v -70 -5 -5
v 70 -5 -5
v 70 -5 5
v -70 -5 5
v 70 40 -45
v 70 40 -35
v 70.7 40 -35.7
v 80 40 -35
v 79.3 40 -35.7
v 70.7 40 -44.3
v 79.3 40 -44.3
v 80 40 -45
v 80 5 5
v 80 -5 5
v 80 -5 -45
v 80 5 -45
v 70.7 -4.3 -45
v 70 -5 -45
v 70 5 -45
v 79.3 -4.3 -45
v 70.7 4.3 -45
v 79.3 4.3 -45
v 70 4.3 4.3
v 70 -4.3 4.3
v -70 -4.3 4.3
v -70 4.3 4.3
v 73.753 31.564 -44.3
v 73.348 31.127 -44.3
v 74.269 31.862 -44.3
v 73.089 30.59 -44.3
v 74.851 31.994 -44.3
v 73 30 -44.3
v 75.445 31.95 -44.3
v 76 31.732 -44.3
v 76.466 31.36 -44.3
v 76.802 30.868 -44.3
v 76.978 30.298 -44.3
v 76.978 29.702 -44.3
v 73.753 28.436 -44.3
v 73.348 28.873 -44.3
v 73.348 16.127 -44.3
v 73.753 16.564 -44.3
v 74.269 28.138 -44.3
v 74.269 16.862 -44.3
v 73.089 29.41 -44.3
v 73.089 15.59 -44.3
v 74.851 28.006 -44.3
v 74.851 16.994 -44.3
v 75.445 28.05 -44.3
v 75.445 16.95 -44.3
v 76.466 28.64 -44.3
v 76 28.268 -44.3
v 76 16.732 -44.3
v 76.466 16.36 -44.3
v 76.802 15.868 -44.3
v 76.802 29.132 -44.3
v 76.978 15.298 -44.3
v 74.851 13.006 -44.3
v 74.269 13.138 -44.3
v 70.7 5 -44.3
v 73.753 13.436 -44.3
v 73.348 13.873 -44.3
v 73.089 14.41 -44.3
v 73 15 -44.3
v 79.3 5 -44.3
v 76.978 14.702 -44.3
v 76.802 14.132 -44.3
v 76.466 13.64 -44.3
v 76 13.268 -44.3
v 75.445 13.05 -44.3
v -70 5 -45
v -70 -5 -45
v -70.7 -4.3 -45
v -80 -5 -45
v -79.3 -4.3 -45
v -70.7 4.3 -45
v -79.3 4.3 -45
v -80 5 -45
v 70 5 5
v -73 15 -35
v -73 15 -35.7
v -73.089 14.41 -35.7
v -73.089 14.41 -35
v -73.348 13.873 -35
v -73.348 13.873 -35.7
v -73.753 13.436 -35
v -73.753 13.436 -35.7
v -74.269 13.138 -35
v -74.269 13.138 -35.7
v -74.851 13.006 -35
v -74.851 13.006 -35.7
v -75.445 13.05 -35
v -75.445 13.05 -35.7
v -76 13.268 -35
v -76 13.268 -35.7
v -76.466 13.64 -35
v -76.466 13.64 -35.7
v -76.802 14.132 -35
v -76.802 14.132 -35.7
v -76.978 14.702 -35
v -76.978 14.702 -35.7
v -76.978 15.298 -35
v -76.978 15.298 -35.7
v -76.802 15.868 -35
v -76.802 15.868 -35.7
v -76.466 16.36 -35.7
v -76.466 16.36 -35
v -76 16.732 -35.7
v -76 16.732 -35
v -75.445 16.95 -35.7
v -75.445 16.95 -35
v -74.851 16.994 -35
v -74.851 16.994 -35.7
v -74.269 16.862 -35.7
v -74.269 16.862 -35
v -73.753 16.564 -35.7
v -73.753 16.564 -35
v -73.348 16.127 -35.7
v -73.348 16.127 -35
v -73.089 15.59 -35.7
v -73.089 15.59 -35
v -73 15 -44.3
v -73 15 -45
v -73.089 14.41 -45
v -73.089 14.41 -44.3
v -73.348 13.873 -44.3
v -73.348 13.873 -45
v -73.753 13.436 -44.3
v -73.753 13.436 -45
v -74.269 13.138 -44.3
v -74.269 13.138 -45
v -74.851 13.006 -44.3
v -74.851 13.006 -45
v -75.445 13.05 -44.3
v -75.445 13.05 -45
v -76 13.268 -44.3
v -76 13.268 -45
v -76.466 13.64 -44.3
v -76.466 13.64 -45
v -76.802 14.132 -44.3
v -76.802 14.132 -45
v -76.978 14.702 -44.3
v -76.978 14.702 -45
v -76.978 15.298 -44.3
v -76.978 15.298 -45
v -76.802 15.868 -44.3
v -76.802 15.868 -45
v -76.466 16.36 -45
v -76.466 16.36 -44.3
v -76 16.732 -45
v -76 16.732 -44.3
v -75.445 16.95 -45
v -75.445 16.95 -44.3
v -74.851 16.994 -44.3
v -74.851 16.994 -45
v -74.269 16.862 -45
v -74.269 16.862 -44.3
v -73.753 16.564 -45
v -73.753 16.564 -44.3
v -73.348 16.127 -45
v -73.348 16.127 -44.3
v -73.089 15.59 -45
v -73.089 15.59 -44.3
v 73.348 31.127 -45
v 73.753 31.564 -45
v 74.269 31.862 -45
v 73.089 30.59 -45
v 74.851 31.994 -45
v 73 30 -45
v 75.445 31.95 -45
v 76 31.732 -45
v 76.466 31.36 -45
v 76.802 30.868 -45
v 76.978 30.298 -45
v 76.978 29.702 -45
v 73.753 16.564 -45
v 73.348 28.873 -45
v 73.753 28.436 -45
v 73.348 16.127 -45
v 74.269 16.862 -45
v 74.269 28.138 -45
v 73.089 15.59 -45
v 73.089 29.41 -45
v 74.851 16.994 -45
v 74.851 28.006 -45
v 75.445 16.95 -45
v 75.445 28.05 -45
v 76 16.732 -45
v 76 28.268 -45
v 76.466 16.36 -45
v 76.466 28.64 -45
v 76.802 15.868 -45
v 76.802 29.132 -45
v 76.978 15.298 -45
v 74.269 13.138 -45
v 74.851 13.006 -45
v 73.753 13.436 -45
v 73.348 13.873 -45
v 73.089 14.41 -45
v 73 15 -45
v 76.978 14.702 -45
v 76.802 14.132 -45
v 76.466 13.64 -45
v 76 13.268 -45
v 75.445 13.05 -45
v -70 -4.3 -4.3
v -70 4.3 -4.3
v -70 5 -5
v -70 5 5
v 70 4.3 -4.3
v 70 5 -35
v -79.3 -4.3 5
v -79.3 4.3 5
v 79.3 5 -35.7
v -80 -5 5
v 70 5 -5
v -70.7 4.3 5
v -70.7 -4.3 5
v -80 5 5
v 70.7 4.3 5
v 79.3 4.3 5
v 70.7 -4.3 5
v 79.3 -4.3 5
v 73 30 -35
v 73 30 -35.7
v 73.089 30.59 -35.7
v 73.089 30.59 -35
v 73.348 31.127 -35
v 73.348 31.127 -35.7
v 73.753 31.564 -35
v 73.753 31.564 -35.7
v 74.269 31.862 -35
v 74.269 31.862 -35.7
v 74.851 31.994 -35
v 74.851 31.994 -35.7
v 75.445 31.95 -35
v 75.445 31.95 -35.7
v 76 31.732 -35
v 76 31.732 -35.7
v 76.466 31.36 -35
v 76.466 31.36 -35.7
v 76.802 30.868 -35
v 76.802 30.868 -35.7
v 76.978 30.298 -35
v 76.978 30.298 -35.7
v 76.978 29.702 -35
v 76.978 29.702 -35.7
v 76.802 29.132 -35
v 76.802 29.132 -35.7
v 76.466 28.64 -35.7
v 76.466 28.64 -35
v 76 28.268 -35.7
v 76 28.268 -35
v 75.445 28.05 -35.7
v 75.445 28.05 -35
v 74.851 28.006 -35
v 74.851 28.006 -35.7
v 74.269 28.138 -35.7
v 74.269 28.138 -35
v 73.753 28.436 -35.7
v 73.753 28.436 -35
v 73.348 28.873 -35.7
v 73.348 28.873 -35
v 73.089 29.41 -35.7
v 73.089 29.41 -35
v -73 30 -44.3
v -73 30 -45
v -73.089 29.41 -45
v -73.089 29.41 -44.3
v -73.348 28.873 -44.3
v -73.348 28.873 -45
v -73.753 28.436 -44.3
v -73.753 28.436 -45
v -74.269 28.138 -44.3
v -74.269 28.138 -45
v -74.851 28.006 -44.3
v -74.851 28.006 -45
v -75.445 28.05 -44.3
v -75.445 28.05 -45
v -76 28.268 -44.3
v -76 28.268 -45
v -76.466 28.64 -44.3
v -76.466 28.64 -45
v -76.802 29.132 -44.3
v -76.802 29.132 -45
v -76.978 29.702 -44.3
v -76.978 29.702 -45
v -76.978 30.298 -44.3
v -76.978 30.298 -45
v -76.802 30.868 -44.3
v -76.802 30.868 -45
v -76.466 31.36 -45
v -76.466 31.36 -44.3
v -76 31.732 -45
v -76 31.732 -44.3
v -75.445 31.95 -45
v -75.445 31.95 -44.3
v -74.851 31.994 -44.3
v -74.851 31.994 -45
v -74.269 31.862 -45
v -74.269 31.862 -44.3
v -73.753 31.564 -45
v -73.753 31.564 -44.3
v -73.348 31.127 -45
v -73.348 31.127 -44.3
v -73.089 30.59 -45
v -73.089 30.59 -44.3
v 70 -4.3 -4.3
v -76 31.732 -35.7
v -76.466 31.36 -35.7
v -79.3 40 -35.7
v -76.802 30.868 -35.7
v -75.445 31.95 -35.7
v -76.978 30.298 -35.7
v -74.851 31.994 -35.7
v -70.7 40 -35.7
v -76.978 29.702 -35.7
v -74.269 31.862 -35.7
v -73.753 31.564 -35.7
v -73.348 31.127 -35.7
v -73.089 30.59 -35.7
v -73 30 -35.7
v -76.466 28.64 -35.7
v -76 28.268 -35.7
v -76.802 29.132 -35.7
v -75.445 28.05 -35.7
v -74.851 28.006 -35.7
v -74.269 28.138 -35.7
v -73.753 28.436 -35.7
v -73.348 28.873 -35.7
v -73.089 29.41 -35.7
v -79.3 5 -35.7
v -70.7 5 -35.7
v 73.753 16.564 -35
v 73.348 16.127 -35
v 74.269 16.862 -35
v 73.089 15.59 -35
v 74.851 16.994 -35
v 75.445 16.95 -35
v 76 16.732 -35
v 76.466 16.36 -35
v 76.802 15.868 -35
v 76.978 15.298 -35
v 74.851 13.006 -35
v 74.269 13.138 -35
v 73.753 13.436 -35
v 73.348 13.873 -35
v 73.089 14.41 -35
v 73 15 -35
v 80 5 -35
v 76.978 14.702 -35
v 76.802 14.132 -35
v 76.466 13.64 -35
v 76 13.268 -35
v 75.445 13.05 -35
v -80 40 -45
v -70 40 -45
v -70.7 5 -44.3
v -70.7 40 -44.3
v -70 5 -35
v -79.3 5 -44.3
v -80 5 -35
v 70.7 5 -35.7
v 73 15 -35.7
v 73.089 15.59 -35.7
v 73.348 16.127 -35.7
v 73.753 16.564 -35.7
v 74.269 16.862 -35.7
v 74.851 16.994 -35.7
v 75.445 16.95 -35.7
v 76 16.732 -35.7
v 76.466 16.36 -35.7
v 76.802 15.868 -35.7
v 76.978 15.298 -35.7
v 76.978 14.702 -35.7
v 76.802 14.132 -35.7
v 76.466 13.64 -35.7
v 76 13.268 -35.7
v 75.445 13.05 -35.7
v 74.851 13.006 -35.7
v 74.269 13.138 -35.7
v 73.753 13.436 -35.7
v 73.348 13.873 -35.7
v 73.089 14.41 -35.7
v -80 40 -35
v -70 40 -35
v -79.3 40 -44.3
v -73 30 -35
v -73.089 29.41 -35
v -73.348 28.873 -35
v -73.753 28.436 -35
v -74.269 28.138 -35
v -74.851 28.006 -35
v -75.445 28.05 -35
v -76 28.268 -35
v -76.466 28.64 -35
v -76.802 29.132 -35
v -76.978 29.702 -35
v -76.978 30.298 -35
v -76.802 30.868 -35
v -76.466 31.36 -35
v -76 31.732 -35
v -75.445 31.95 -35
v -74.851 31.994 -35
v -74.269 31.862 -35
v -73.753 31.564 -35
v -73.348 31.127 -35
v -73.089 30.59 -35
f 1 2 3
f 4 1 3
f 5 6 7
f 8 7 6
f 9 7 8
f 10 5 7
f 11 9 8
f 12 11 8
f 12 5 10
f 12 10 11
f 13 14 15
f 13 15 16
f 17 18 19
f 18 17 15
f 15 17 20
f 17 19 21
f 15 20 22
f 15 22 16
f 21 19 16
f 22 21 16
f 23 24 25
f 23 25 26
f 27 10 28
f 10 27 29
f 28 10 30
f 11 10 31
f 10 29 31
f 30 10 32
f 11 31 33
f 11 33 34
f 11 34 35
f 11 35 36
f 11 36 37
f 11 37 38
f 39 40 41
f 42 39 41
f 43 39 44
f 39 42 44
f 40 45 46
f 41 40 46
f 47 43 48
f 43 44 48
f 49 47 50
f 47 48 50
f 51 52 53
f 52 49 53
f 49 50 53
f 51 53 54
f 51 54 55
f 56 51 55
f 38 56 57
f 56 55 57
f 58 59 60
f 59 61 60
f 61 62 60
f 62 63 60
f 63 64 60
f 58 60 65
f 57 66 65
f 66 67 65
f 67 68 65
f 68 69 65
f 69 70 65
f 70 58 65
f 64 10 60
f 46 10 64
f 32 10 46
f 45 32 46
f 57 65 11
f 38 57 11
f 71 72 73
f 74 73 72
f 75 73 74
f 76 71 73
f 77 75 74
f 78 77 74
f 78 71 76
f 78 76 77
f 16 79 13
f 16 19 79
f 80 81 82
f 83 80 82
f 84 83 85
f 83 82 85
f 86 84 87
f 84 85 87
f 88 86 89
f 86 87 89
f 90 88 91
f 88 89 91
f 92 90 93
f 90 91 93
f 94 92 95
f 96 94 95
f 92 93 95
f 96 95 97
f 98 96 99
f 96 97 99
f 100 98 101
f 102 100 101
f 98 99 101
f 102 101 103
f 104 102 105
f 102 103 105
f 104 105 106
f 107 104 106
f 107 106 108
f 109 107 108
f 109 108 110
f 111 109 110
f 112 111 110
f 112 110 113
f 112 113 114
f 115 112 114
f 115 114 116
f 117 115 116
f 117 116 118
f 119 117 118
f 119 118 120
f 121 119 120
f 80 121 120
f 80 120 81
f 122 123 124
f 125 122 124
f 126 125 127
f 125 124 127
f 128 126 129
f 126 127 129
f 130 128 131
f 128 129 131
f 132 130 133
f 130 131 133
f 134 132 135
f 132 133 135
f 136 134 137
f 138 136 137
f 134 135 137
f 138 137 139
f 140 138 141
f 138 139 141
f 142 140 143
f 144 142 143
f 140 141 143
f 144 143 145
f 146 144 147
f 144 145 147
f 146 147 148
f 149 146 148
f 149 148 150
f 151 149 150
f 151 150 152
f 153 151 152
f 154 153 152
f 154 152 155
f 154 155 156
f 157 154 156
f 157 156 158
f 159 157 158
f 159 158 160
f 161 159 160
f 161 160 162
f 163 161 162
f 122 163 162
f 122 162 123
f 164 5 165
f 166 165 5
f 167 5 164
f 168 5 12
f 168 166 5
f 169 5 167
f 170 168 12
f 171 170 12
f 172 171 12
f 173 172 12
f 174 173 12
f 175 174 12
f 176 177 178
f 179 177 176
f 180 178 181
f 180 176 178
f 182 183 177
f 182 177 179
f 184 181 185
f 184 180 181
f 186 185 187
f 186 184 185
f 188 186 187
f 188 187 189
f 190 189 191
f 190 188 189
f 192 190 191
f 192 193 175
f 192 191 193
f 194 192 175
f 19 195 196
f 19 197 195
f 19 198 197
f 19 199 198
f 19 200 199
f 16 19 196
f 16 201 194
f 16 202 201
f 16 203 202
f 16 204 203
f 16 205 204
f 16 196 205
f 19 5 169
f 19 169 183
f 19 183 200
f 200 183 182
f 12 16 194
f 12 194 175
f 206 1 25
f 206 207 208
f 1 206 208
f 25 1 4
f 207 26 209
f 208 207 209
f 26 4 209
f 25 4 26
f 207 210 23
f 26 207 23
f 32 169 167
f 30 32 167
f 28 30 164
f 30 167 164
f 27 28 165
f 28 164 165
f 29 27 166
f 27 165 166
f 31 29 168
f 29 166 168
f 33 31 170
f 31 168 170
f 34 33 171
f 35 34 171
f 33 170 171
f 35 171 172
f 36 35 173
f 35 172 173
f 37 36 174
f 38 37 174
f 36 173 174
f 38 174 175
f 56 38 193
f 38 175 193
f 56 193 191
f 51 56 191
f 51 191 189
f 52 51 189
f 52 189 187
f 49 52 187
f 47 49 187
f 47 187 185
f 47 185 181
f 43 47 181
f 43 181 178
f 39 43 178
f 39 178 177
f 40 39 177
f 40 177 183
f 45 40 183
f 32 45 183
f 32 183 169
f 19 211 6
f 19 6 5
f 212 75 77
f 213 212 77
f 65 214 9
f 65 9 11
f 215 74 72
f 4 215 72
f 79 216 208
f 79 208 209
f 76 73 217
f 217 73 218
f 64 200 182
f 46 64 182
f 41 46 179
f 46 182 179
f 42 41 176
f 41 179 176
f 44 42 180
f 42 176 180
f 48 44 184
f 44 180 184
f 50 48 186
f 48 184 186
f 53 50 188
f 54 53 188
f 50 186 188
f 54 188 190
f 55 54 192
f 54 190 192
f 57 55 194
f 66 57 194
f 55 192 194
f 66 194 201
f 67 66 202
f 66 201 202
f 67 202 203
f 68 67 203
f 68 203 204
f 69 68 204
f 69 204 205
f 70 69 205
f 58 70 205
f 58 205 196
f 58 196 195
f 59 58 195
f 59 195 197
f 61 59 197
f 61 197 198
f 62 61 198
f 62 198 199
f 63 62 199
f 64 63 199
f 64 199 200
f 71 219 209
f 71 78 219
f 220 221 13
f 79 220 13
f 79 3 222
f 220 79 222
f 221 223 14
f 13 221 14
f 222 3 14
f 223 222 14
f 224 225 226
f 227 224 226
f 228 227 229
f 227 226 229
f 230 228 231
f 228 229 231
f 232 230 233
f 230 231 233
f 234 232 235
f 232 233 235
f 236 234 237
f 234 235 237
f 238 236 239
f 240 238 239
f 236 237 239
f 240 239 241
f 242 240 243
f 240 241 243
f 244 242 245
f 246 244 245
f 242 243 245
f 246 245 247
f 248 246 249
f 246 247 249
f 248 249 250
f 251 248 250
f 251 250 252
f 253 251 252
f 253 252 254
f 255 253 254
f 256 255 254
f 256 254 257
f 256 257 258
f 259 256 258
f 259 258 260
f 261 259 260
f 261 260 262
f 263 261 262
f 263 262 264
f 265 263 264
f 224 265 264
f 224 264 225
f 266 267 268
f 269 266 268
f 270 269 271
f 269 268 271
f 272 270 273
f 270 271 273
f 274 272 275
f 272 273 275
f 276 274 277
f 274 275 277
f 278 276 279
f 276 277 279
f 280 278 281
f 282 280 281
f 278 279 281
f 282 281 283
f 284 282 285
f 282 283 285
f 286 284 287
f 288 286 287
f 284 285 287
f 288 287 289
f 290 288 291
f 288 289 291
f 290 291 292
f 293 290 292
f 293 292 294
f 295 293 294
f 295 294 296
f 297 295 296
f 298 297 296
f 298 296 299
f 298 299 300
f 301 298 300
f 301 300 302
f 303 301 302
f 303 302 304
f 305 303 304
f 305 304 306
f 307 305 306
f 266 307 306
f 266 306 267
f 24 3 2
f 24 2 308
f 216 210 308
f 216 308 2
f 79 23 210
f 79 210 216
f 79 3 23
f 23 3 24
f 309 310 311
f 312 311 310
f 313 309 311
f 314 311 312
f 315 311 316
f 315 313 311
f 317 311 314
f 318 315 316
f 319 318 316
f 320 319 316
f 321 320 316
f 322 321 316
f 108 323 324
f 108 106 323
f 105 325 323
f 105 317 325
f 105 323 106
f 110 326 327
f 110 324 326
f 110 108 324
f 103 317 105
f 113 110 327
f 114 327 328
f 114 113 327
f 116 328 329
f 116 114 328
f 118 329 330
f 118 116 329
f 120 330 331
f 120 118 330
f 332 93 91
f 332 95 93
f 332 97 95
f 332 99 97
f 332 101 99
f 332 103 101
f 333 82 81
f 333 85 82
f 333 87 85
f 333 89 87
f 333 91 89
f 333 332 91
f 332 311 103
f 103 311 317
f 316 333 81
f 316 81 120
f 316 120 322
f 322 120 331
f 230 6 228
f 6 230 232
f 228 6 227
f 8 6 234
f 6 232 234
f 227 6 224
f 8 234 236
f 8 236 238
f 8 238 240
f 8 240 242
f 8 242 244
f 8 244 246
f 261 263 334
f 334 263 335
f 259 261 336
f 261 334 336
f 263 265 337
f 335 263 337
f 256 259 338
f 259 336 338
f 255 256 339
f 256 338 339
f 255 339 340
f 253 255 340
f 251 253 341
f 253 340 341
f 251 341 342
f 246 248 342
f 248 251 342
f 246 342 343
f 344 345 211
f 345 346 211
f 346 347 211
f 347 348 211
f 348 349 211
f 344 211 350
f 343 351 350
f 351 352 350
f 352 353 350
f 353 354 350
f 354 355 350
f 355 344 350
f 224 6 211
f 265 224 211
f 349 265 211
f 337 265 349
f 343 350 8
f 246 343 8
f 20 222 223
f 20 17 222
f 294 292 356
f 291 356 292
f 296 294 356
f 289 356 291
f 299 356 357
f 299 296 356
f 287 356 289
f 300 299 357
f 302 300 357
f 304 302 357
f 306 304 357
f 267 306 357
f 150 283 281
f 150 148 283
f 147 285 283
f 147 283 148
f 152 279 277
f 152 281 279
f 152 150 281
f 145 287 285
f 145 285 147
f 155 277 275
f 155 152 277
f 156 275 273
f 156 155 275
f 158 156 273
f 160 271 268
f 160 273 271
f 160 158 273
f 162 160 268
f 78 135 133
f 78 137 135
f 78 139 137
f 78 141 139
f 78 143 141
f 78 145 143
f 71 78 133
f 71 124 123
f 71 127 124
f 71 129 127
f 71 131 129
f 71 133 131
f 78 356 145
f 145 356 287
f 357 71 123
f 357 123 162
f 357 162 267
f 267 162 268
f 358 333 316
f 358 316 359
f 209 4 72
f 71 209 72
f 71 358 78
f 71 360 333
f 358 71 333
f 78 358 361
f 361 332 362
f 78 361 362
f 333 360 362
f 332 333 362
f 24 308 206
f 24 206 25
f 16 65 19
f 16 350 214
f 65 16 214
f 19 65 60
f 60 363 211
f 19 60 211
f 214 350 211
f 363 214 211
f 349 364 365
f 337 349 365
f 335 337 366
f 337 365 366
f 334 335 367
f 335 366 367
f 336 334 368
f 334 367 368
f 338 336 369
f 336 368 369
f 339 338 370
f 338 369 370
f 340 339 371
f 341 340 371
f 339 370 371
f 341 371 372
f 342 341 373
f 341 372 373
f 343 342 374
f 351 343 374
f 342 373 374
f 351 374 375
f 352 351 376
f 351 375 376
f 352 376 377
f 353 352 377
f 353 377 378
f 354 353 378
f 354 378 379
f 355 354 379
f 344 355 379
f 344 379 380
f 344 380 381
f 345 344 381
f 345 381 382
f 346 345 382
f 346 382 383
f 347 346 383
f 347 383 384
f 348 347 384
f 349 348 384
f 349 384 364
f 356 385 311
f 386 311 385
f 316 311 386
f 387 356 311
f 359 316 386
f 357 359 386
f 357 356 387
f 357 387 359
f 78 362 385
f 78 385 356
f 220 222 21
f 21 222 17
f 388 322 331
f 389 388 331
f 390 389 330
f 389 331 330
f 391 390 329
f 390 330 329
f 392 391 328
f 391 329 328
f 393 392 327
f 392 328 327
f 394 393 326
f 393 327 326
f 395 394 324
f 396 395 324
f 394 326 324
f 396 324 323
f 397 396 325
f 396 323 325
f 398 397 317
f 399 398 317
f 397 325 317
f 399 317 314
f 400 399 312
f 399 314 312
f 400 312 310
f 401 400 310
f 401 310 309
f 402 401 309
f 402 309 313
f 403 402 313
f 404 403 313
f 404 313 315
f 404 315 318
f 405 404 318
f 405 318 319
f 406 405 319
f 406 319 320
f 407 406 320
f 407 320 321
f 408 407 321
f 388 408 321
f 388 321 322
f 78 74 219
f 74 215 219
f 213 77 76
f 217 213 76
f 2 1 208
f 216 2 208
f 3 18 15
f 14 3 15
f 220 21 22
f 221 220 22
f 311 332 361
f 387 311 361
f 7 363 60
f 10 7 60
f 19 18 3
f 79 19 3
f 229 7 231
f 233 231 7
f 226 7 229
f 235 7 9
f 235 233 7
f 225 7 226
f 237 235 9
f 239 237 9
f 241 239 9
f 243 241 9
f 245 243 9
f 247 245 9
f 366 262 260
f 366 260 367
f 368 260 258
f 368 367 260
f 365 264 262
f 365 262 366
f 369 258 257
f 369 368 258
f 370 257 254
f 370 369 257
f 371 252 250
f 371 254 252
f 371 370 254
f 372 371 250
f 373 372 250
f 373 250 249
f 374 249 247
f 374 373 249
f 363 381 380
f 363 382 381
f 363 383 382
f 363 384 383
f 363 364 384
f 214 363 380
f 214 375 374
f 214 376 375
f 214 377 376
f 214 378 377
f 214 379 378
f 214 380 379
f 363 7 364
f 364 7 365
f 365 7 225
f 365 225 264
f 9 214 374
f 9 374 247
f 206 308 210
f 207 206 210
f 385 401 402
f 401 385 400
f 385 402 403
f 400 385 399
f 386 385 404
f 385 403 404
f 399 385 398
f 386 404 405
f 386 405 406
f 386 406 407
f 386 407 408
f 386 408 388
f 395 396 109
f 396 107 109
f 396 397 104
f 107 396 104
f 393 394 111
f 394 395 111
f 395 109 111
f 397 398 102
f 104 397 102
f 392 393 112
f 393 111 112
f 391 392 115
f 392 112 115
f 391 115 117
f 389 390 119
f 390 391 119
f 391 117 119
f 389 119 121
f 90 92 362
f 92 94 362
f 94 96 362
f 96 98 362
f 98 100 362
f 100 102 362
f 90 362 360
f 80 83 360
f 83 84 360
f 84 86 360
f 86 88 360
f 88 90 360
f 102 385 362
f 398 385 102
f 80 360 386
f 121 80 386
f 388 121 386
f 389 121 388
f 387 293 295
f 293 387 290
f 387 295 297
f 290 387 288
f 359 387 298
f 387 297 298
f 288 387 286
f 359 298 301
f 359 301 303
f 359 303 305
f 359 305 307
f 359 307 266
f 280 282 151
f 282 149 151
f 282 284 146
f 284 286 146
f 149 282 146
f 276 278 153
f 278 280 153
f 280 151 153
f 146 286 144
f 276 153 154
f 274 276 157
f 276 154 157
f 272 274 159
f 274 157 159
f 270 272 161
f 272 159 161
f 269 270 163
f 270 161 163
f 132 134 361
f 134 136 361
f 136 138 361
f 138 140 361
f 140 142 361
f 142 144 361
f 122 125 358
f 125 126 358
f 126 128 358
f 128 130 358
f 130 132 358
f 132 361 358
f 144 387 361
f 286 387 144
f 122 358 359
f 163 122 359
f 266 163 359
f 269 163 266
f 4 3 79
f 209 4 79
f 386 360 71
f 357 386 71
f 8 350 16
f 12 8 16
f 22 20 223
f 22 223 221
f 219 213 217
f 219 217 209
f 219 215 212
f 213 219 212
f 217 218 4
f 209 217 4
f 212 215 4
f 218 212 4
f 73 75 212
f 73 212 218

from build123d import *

# Parameters (mm, degrees)
SKETCH_11_ON_SEGMENT_1_W   = 10
SKETCH_11_ON_SEGMENT_1_H   = 10
SKETCH_11_ON_SEGMENT_1_W_2 = 8.6
SKETCH_11_ON_SEGMENT_1_H_2 = 8.6
F_10X10X0_7_1_DEPTH        = 48.071067812
SKETCH_11_ON_SEGMENT_2_W   = 10
SKETCH_11_ON_SEGMENT_2_H   = 10
SKETCH_11_ON_SEGMENT_2_W_2 = 8.6
SKETCH_11_ON_SEGMENT_2_H_2 = 8.6
F_10X10X0_7_1_2_DEPTH      = 166.142135624
F_10X10X0_7_1_3_DEPTH      = 40
F_10X10X0_7_1_3_DEPTH_BACK = 8.071067812
SKETCH_11_W                = 10
SKETCH_11_H                = 10
SKETCH_11_W_2              = 8.6
SKETCH_11_H_2              = 8.6
SKETCH_14_W                = 10
SKETCH_14_H                = 10
SKETCH_14_W_2              = 8.6
SKETCH_14_H_2              = 8.6
F_10X10X0_7_5_DEPTH        = 45
SKETCH_14_ON_SEGMENT_2_W   = 10
SKETCH_14_ON_SEGMENT_2_H   = 10
SKETCH_14_ON_SEGMENT_2_W_2 = 8.6
SKETCH_14_ON_SEGMENT_2_H_2 = 8.6
F_10X10X0_7_5_2_DEPTH      = 45
PART_START                 = 22.5
PART_RUN_ON_DEPTH          = 27.5
BODY_START                 = 17.5
BODY_3_RUN_ON_DEPTH        = 27.5
WELD_START                 = -5
WELD_TRIM_4_DEPTH          = 10
WELD_TRIM_4_2_DEPTH        = 0.7
WELD_START_2               = 4.3
WELD_TRIM_4_3_DEPTH        = 0.7
WELD_START_3               = 70
WELD_TRIM_4_4_OUTLINE_W    = 12
WELD_TRIM_4_4_OUTLINE_H    = 14
WELD_TRIM_4_4_DEPTH        = 10
WELD_START_4               = -80
WELD_TRIM_5_OUTLINE_W      = 12
WELD_TRIM_5_OUTLINE_H      = 13
WELD_TRIM_5_DEPTH          = 10
WELD_TRIM_5_2_DEPTH        = 10
WELD_TRIM_5_3_DEPTH        = 0.7
WELD_TRIM_5_4_DEPTH        = 0.7
SKETCH_15_R                = 2
CUT_EXTRUDE_1_DEPTH        = 10


# Read off the part's stored shape, not the designer's step: 剪裁/延伸4, 剪裁/延伸5
with BuildPart() as part:
    # 草图11 on segment 1 (carried to segment 1) → 常用材料 不锈钢10X10X0.7(1) (new body)
    with BuildSketch(Plane(origin=(75, 0, -40), x_dir=(1, 0, 0), z_dir=(0, 0, 1))):
        Rectangle(SKETCH_11_ON_SEGMENT_1_W, SKETCH_11_ON_SEGMENT_1_H)
        Rectangle(SKETCH_11_ON_SEGMENT_1_W_2, SKETCH_11_ON_SEGMENT_1_H_2, mode=Mode.SUBTRACT)
    extrude(amount=F_10X10X0_7_1_DEPTH)

    # 常用材料 不锈钢10X10X0.7(1) mitre 1
    split(bisect_by=Plane(origin=(75, 0, 0), x_dir=(0, 1, 0), z_dir=(0.707106781, 0, -0.707106781)), keep=Keep.TOP)

    # part cut square before the run-on
    split(bisect_by=Plane(origin=(75, 0, -17.5), x_dir=(0, -1, 0), z_dir=(0, 0, 1)), keep=Keep.TOP)

    # 草图11 on segment 1 (carried to segment 1) → part run on (add)
    with BuildSketch(Plane(origin=(75, 0, -40), x_dir=(1, 0, 0), z_dir=(0, 0, 1)).offset(PART_START)):
        Rectangle(SKETCH_11_ON_SEGMENT_1_W, SKETCH_11_ON_SEGMENT_1_H)
        Rectangle(SKETCH_11_ON_SEGMENT_1_W_2, SKETCH_11_ON_SEGMENT_1_H_2, mode=Mode.SUBTRACT)
    extrude(amount=-PART_RUN_ON_DEPTH)

    # Weld Trim 4 outline → Weld Trim 4 (add)
    with BuildSketch(Plane(origin=(0, 0, 0), x_dir=(1, 0, 0), z_dir=(0, 1, 0)).offset(WELD_START)):
        Polygon((70, 5), (70, -5), (70.7, -5), (70.7, 4.3), align=None)
        Polygon((79.3, -4.3), (79.3, -5), (80, -5), align=None)
    extrude(amount=WELD_TRIM_4_DEPTH)

    # Weld Trim 4 2 outline → Weld Trim 4 2 (add)
    with BuildSketch(Plane(origin=(0, 0, 0), x_dir=(1, 0, 0), z_dir=(0, 1, 0)).offset(WELD_START)):
        Polygon((70.7, 4.3), (70.7, -5), (79.3, -5), (79.3, -4.3), align=None)
    extrude(amount=WELD_TRIM_4_2_DEPTH)

    # Weld Trim 4 3 outline → Weld Trim 4 3 (add)
    with BuildSketch(Plane(origin=(0, 0, 0), x_dir=(1, 0, 0), z_dir=(0, 1, 0)).offset(WELD_START_2)):
        Polygon((70.7, 4.3), (70.7, -5), (79.3, -5), (79.3, -4.3), align=None)
    extrude(amount=WELD_TRIM_4_3_DEPTH)


with BuildPart() as body_2:
    # 草图11 on segment 2 (carried to segment 2) → 10X10X0.7_1 2 (new body)
    with BuildSketch(Plane.ZY.offset(-83.071067812)):
        Rectangle(SKETCH_11_ON_SEGMENT_2_W, SKETCH_11_ON_SEGMENT_2_H)
        Rectangle(SKETCH_11_ON_SEGMENT_2_W_2, SKETCH_11_ON_SEGMENT_2_H_2, mode=Mode.SUBTRACT)
    extrude(amount=F_10X10X0_7_1_2_DEPTH)

    # 10X10X0.7_1 2 mitre 1
    split(bisect_by=Plane(origin=(75, 0, 0), x_dir=(0, -1, 0), z_dir=(-0.707106781, 0, 0.707106781)), keep=Keep.TOP)

    # 10X10X0.7_1 2 mitre 2
    split(bisect_by=Plane(origin=(-75, 0, 0), x_dir=(0, 1, 0), z_dir=(0.707106781, 0, 0.707106781)), keep=Keep.TOP)

    # Weld Trim 4 4 outline → Weld Trim 4 4 (cut)
    with BuildSketch(Plane.YZ.offset(WELD_START_3)):
        Rectangle(WELD_TRIM_4_4_OUTLINE_W, WELD_TRIM_4_4_OUTLINE_H)
    extrude(amount=WELD_TRIM_4_4_DEPTH, mode=Mode.SUBTRACT)

    # Weld Trim 5 outline → Weld Trim 5 (cut)
    with BuildSketch(Plane.YZ.offset(WELD_START_4)):
        with Locations((0, 0.5)):
            Rectangle(WELD_TRIM_5_OUTLINE_W, WELD_TRIM_5_OUTLINE_H)
    extrude(amount=WELD_TRIM_5_DEPTH, mode=Mode.SUBTRACT)


with BuildPart() as body_3:
    # 草图11 → 10X10X0.7_1 3 (new, two sides: drawn at the far end of the back side and taken through both)
    with BuildSketch(Plane(origin=(-75, 0, 0), x_dir=(-1, 0, 0), z_dir=(0, 0, -1)).offset(-F_10X10X0_7_1_3_DEPTH_BACK)):
        Rectangle(SKETCH_11_W, SKETCH_11_H)
        Rectangle(SKETCH_11_W_2, SKETCH_11_H_2, mode=Mode.SUBTRACT)
    extrude(amount=F_10X10X0_7_1_3_DEPTH + F_10X10X0_7_1_3_DEPTH_BACK)

    # 10X10X0.7_1 3 mitre 1
    split(bisect_by=Plane(origin=(-75, 0, 0), x_dir=(0, -1, 0), z_dir=(-0.707106781, 0, -0.707106781)), keep=Keep.TOP)

    # body 3 cut square before the run-on
    split(bisect_by=Plane(origin=(-75, 0, -17.5), x_dir=(0, -1, 0), z_dir=(0, 0, 1)), keep=Keep.TOP)

    # 草图11 → body 3 run on (add)
    with BuildSketch(Plane(origin=(-75, 0, 0), x_dir=(-1, 0, 0), z_dir=(0, 0, -1)).offset(BODY_START)):
        Rectangle(SKETCH_11_W, SKETCH_11_H)
        Rectangle(SKETCH_11_W_2, SKETCH_11_H_2, mode=Mode.SUBTRACT)
    extrude(amount=BODY_3_RUN_ON_DEPTH)

    # Weld Trim 5 2 outline → Weld Trim 5 2 (add)
    with BuildSketch(Plane(origin=(0, 0, 0), x_dir=(1, 0, 0), z_dir=(0, 1, 0)).offset(WELD_START)):
        Polygon((-70, -5), (-70, 5), (-70.7, 4.3), (-70.7, -5), align=None)
        Polygon((-79.3, -5), (-79.3, -4.3), (-80, -5), align=None)
    extrude(amount=WELD_TRIM_5_2_DEPTH)

    # Weld Trim 5 3 outline → Weld Trim 5 3 (add)
    with BuildSketch(Plane(origin=(0, 0, 0), x_dir=(1, 0, 0), z_dir=(0, 1, 0)).offset(WELD_START)):
        Polygon((-70.7, -5), (-70.7, 4.3), (-79.3, -4.3), (-79.3, -5), align=None)
    extrude(amount=WELD_TRIM_5_3_DEPTH)

    # Weld Trim 5 4 outline → Weld Trim 5 4 (add)
    with BuildSketch(Plane(origin=(0, 0, 0), x_dir=(1, 0, 0), z_dir=(0, 1, 0)).offset(WELD_START_2)):
        Polygon((-70.7, -5), (-70.7, 4.3), (-79.3, -4.3), (-79.3, -5), align=None)
    extrude(amount=WELD_TRIM_5_4_DEPTH)


with BuildPart() as body_4:
    # 草图14 → 常用材料 不锈钢10X10X0.7(5) (new body)
    with BuildSketch(Plane(origin=(75, -5, -40), x_dir=(1, 0, 0), z_dir=(0, 1, 0))):
        Rectangle(SKETCH_14_W, SKETCH_14_H)
        Rectangle(SKETCH_14_W_2, SKETCH_14_H_2, mode=Mode.SUBTRACT)
    extrude(amount=F_10X10X0_7_5_DEPTH)

    # Weld Trim 1 3
    split(bisect_by=Plane(origin=(75.208333333, 5, -19.895833333), x_dir=(-1, 0, 0), z_dir=(0, 1, 0)), keep=Keep.TOP)


with BuildPart() as body_5:
    # 草图14 on segment 2 (carried to segment 2) → 10X10X0.7_5 2 (new body)
    with BuildSketch(Plane(origin=(-75, -5, -40), x_dir=(1, 0, 0), z_dir=(0, 1, 0))):
        Rectangle(SKETCH_14_ON_SEGMENT_2_W, SKETCH_14_ON_SEGMENT_2_H)
        Rectangle(SKETCH_14_ON_SEGMENT_2_W_2, SKETCH_14_ON_SEGMENT_2_H_2, mode=Mode.SUBTRACT)
    extrude(amount=F_10X10X0_7_5_2_DEPTH)

    # Weld Trim 2 3
    split(bisect_by=Plane(origin=(-75.208333333, 5, -19.895833333), x_dir=(-1, 0, 0), z_dir=(0, 1, 0)), keep=Keep.TOP)


with BuildPart() as cut_extrude_1_tool:
    # 草图15 → 切除-拉伸1 (new body)
    with BuildSketch(Plane(origin=(0, 0, -45), x_dir=(-1, 0, 0), z_dir=(0, 0, -1))):
        with Locations((-75, 30)):
            Circle(SKETCH_15_R)
        with Locations((-75, 15)):
            Circle(SKETCH_15_R)
        with Locations(Location((75, 30, 0), (0, 0, 180))):
            Circle(SKETCH_15_R)
        with Locations(Location((75, 15, 0), (0, 0, 180))):
            Circle(SKETCH_15_R)
    extrude(amount=-CUT_EXTRUDE_1_DEPTH)


with BuildPart() as body_4_1:
    add(body_4.part)

    # 切除-拉伸1: cut by cut_extrude_1_tool
    add(cut_extrude_1_tool.part, mode=Mode.SUBTRACT)


with BuildPart() as body_5_1:
    add(body_5.part)

    # 切除-拉伸1: cut by cut_extrude_1_tool
    add(cut_extrude_1_tool.part, mode=Mode.SUBTRACT)


solid = Compound([part.part, body_2.part, body_3.part, body_4_1.part, body_5_1.part])
